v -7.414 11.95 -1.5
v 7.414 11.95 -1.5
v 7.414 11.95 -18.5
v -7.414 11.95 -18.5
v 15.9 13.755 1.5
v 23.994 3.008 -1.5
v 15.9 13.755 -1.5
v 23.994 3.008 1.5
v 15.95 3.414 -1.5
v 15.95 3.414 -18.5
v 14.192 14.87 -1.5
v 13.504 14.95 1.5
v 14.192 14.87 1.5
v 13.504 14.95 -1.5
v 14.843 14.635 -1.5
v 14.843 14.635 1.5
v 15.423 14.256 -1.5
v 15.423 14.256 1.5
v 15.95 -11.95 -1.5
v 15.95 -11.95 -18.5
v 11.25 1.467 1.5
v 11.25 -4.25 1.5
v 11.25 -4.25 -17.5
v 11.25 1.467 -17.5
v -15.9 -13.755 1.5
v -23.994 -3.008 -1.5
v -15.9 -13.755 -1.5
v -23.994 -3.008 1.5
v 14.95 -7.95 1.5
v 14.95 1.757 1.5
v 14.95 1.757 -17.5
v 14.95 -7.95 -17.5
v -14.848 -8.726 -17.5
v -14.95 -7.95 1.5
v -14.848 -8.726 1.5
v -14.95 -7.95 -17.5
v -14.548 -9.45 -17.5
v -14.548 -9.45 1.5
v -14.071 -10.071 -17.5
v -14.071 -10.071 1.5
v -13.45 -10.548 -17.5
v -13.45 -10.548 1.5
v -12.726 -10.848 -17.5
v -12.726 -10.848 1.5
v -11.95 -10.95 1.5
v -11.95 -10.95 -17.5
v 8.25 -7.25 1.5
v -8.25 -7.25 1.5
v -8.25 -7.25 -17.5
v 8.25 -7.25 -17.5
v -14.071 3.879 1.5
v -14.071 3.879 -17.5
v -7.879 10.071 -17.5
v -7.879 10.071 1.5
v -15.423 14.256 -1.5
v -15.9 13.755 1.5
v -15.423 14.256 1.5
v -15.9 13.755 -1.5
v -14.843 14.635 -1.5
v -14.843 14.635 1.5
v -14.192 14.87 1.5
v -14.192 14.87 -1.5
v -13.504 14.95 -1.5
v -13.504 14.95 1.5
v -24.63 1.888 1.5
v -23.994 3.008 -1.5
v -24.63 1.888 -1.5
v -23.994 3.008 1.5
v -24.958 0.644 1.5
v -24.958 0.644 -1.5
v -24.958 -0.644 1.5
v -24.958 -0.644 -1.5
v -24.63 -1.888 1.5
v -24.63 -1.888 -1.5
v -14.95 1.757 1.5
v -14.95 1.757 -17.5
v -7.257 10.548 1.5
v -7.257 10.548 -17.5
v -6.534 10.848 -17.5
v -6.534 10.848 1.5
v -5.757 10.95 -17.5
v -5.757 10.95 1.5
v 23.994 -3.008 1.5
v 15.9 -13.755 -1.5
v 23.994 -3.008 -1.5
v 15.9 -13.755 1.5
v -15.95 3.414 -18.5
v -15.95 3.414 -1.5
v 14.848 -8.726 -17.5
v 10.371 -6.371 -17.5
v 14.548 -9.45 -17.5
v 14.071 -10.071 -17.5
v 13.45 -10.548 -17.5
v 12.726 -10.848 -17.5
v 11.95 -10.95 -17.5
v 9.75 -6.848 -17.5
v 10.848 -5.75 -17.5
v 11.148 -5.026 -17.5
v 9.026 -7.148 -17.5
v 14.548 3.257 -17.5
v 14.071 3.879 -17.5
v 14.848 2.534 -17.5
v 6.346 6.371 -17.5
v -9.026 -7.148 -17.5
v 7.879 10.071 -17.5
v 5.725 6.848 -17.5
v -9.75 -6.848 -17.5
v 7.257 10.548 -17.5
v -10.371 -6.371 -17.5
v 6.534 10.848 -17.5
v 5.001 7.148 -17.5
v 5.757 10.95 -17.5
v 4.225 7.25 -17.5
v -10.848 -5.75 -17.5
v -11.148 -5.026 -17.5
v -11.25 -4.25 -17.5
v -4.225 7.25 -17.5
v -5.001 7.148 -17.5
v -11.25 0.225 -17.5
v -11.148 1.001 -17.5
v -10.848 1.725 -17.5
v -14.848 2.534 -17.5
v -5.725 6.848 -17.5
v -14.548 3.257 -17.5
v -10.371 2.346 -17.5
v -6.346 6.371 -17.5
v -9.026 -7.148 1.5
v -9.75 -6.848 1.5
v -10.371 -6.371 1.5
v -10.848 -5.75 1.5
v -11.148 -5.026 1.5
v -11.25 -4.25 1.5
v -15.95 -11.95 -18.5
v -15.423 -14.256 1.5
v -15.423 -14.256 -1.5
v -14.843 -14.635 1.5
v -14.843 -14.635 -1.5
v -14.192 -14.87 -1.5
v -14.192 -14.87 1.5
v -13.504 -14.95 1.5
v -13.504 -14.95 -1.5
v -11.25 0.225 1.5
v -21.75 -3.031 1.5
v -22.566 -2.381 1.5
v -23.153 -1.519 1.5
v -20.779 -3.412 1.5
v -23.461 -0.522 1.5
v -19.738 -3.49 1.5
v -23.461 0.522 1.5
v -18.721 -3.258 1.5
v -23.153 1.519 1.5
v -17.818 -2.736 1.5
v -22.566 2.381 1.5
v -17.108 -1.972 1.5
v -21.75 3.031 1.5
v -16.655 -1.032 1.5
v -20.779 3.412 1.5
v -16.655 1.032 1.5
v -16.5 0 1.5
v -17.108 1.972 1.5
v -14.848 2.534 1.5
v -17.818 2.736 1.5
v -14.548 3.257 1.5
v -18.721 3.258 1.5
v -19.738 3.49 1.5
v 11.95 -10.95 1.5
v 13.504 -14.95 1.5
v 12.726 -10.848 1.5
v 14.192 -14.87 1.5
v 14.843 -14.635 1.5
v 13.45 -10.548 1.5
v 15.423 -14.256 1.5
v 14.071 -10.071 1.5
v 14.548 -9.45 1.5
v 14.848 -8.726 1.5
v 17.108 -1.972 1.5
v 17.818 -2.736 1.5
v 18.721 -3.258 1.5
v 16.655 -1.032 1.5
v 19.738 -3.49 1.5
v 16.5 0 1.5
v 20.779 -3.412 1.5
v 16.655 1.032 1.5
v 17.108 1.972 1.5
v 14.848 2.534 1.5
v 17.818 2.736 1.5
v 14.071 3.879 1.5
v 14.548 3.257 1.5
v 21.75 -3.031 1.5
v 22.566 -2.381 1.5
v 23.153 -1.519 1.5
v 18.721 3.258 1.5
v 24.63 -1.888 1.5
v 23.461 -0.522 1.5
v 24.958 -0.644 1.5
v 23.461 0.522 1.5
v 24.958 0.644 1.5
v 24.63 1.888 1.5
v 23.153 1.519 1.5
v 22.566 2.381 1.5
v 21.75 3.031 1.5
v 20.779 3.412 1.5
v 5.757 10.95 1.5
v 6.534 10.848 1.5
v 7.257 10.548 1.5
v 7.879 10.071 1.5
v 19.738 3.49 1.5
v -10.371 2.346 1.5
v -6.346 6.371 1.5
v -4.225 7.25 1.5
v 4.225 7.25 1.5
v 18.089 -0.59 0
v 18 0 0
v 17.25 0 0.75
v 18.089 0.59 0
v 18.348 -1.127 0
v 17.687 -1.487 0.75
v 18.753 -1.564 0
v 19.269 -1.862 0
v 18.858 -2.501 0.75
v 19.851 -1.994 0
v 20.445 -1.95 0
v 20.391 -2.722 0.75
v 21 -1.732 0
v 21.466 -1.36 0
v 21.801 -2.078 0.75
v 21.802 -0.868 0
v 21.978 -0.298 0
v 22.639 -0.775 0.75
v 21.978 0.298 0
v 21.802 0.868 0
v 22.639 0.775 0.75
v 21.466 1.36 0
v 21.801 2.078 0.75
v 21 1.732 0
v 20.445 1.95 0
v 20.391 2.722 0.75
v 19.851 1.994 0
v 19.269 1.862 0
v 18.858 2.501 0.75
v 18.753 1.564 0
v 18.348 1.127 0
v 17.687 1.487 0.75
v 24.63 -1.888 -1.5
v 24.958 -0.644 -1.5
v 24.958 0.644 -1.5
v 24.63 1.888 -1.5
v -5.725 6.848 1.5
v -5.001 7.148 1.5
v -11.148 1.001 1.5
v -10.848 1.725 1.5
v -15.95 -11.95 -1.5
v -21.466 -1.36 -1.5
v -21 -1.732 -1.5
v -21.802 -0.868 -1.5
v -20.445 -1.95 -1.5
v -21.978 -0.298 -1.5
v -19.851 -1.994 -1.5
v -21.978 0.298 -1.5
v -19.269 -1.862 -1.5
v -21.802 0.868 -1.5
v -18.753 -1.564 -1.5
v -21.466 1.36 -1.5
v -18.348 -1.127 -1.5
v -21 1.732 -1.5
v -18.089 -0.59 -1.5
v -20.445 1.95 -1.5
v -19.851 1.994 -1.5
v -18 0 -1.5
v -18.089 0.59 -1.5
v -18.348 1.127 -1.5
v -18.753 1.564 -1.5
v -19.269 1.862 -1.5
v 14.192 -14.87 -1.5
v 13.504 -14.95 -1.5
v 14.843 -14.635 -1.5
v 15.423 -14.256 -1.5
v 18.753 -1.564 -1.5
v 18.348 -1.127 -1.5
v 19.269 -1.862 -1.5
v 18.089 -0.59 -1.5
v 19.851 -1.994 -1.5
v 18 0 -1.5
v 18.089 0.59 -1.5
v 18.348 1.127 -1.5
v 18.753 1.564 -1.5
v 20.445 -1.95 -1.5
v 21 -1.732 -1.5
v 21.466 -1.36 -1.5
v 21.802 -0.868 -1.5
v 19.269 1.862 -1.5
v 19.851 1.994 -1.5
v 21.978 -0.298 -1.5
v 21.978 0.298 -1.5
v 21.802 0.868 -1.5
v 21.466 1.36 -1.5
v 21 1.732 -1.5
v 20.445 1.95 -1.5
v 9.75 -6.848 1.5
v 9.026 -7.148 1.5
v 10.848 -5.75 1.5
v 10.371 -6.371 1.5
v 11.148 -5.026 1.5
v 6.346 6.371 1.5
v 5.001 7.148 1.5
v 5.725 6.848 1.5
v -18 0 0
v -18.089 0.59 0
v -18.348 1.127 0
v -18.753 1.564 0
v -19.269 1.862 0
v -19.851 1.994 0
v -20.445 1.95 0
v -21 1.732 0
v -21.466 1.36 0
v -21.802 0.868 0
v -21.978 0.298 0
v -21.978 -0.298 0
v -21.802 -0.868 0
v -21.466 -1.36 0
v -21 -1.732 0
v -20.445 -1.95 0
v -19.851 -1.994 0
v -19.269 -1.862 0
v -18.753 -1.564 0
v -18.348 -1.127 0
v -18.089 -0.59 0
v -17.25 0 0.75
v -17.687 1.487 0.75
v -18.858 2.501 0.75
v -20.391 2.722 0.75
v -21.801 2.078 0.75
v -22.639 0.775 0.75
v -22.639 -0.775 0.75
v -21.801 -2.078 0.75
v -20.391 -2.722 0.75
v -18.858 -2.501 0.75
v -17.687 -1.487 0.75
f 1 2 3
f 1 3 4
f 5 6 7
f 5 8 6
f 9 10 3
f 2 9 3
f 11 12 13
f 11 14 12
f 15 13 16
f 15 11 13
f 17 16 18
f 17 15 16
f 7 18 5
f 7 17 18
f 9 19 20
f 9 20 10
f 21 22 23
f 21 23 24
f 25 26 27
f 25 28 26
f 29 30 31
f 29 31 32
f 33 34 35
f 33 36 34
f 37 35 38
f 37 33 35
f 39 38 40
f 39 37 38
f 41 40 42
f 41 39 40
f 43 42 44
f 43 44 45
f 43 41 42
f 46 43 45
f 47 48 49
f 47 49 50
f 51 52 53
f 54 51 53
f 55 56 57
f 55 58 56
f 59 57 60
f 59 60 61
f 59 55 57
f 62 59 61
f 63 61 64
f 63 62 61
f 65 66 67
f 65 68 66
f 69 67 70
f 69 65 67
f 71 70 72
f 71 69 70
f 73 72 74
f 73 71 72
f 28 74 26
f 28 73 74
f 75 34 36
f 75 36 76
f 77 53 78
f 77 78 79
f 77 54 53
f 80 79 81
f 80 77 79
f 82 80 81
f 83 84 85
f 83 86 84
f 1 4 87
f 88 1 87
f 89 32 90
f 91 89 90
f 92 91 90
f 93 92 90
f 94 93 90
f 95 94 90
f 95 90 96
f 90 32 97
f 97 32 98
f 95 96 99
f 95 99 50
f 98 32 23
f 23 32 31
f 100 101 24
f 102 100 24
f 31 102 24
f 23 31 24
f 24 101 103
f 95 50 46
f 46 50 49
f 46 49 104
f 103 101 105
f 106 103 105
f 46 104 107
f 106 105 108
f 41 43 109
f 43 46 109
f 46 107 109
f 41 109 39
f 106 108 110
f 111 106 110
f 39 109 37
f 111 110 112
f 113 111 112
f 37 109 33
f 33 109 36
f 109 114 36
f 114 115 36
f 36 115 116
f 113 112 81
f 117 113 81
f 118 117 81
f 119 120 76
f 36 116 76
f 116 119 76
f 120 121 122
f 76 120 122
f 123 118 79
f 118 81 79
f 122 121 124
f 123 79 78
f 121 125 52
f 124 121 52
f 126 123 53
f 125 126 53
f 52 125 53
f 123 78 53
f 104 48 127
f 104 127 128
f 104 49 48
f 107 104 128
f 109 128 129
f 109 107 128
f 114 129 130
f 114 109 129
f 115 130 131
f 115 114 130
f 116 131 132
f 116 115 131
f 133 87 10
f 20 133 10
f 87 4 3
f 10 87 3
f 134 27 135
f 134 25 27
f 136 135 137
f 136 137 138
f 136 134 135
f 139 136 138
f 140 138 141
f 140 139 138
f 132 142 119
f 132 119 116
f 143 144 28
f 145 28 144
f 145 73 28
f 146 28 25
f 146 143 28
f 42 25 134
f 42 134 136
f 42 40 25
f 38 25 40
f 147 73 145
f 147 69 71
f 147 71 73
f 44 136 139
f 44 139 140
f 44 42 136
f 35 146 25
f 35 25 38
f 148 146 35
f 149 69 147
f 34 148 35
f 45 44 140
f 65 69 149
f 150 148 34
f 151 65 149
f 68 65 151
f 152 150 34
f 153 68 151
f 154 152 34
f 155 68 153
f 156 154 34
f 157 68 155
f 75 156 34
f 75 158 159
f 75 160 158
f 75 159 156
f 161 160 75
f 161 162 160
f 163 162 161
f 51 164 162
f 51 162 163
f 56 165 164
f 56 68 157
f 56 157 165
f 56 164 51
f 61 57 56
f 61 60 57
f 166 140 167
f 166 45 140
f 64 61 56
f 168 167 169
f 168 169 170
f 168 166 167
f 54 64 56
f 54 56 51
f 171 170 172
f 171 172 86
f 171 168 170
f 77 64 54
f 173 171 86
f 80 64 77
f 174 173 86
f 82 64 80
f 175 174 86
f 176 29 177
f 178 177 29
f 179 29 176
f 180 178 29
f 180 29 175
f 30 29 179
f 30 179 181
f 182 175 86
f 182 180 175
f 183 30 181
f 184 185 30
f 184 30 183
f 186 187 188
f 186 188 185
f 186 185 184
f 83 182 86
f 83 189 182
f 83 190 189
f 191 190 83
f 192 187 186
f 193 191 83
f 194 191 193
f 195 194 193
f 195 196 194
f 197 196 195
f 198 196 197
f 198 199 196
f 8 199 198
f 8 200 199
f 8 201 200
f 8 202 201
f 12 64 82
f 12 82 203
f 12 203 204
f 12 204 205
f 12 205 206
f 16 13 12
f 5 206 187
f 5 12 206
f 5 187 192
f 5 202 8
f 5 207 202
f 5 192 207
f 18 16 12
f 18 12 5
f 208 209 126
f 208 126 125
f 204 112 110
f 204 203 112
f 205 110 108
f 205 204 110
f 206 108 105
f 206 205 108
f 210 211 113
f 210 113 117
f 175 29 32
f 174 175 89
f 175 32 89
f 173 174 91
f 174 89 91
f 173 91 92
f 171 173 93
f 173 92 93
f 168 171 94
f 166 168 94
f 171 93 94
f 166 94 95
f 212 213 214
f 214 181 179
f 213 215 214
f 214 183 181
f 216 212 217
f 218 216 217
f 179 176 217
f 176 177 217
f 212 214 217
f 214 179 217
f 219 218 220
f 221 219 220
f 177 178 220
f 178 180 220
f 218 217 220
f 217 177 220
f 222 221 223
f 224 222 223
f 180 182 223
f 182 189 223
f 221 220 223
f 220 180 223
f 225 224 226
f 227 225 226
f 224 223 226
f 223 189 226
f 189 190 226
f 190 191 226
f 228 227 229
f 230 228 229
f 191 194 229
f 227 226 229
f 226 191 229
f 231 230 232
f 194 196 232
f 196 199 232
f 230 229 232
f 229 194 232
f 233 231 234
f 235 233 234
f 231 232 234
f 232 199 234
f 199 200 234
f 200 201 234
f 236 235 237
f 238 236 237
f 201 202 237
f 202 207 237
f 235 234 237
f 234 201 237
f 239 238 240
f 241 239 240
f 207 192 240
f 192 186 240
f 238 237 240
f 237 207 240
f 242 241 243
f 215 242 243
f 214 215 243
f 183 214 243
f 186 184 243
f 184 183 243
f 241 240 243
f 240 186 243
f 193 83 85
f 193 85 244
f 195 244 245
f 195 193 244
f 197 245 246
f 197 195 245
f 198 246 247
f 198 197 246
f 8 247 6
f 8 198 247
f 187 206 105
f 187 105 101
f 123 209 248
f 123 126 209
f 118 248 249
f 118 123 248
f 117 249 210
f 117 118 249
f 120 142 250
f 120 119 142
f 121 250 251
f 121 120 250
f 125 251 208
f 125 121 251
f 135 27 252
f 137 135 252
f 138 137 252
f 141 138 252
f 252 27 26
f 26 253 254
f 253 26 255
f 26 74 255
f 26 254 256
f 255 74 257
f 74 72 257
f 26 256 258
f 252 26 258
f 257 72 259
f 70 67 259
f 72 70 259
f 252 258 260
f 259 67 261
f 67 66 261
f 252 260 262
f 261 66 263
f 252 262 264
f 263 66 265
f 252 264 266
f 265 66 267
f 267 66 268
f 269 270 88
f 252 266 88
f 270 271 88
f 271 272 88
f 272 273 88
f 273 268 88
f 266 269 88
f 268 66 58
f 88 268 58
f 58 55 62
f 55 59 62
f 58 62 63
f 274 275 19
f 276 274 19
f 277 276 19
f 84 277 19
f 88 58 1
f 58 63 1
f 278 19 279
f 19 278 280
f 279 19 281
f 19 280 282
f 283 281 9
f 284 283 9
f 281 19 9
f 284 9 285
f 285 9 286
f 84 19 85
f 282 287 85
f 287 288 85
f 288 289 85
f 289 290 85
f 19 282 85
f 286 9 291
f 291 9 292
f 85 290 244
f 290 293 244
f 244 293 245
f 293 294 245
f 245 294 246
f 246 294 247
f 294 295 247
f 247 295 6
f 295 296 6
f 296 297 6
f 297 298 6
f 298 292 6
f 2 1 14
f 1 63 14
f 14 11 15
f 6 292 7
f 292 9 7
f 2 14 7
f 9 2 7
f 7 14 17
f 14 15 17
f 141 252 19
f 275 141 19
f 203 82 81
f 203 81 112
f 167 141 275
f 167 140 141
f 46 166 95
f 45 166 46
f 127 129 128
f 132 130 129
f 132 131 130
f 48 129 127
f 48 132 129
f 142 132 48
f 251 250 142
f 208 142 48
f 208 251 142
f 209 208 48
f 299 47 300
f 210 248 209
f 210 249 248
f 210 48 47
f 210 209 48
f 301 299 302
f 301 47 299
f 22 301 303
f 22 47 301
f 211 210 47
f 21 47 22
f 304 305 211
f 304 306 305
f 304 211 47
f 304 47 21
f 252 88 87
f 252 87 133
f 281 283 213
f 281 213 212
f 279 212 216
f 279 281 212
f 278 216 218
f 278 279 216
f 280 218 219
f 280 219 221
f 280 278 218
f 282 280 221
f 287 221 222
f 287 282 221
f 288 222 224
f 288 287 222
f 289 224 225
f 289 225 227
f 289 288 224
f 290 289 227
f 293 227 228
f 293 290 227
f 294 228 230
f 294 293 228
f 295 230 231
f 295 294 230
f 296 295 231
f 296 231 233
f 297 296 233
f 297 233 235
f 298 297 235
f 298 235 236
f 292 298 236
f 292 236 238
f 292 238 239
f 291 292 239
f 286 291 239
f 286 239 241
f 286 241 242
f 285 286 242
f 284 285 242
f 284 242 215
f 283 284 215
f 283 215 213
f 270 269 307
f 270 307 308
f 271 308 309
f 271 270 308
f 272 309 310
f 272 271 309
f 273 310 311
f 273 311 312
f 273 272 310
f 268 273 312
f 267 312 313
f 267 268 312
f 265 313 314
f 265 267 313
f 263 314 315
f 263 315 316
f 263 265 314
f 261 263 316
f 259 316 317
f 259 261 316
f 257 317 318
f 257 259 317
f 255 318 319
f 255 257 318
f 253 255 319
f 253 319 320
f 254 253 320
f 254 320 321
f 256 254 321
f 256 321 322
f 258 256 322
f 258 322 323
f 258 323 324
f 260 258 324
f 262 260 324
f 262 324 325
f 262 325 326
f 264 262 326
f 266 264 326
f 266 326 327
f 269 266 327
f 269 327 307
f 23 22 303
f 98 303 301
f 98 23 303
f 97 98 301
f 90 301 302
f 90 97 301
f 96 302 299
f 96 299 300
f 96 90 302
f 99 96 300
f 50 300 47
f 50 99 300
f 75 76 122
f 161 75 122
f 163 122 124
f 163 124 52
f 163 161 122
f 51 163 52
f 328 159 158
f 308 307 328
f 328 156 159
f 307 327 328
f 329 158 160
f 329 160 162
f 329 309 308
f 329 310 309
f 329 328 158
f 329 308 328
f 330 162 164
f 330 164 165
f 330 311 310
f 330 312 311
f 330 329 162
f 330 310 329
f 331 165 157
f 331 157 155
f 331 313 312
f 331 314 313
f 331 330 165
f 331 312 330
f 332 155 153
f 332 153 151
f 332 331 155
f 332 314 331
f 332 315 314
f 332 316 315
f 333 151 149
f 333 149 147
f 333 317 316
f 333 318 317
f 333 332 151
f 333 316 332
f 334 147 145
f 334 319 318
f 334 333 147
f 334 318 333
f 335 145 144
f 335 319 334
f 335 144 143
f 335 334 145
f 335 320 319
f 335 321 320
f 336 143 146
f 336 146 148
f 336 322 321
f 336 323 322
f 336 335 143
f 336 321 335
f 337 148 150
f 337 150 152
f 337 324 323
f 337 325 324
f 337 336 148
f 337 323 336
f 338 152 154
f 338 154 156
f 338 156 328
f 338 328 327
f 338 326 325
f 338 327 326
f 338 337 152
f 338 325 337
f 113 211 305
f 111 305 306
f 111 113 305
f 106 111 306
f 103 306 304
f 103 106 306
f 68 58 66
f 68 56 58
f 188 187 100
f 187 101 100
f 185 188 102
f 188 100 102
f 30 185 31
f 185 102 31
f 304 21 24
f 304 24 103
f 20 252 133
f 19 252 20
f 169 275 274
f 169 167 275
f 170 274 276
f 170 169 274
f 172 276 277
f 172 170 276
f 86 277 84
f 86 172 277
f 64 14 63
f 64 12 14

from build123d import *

# Parameters (mm, degrees)
SKETCH1_R           = 2
BOSS_EXTRUDE1_DEPTH = 1.5
BOSS_EXTRUDE2_START = -3
BOSS_EXTRUDE2_DEPTH = 20
BOSS_EXTRUDE3_DEPTH = 1
CHAMFER1_SIZE       = 1.5
FILLET1_R           = 3


with BuildPart() as part:
    # Sketch1 → Boss-Extrude1 (new, symmetric)
    with BuildSketch(Plane.XY):
        with BuildLine():
            Line((-23.993973904, -3.008018028), (-15, -14.95))
            Line((-15, -14.95), (15, -14.95))
            Line((15, -14.95), (23.993973904, -3.008018028))
            ThreePointArc((23.993973904, -3.008018028), (25, 0), (23.993973904, 3.008018028))
            Line((23.993973904, 3.008018028), (15, 14.95))
            Line((15, 14.95), (-15, 14.95))
            Line((-15, 14.95), (-23.993973904, 3.008018028))
            ThreePointArc((-23.993973904, 3.008018028), (-25, 0), (-23.993973904, -3.008018028))
        make_face()
        with Locations((-20, 0)):
            Circle(SKETCH1_R, mode=Mode.SUBTRACT)
        with Locations(Location((20, 0, 0), (0, 0, 180))):
            Circle(SKETCH1_R, mode=Mode.SUBTRACT)
        Polygon((-14.95, 3), (-7, 10.95), (7, 10.95), (14.95, 3), (14.95, -10.95), (-14.95, -10.95), align=None, mode=Mode.SUBTRACT)
    extrude(amount=BOSS_EXTRUDE1_DEPTH, both=True)

    # Sketch2 → Boss-Extrude2 (add)
    # profile 1 of 2: a face of its own
    with BuildSketch(Plane(origin=(0, 0, -1.5), x_dir=(-1, 0, 0), z_dir=(0, 0, -1)).offset(BOSS_EXTRUDE2_START)):
        Polygon((-15.95, 3.414213562), (-7.414213562, 11.95), (7.414213562, 11.95), (15.95, 3.414213562), (15.95, -11.95), (-15.95, -11.95), align=None)
        Polygon((14.95, -10.95), (-14.95, -10.95), (-14.95, 3), (-7, 10.95), (7, 10.95), (14.95, 3), align=None, mode=Mode.SUBTRACT)
    # profile 2 of 2: a face of its own
    with BuildSketch(Plane(origin=(0, 0, -1.5), x_dir=(-1, 0, 0), z_dir=(0, 0, -1)).offset(BOSS_EXTRUDE2_START)):
        Polygon((-11.25, 1.467409819), (-5.467409819, 7.25), (5.467409819, 7.25), (11.25, 1.467409819), (11.25, -7.25), (-11.25, -7.25), align=None)
    extrude(amount=BOSS_EXTRUDE2_DEPTH)


with BuildPart() as boss_extrude2_piece_1:
    # of the separate pieces the step leaves, piece 1, a body of its own (boss_extrude2_pieces)
    add(part.part.solids().sort_by_distance((11.25, 1.467409819, 1.5))[0])



with BuildPart() as boss_extrude2_piece_2:
    # of the separate pieces the step leaves, piece 2, a body of its own (boss_extrude2_pieces)
    add(part.part.solids().sort_by_distance((-23.993973904, 3.008018028, -1.5))[0])


with BuildPart() as boss_extrude2_piece_1_1:
    add(boss_extrude2_piece_1.part)

    add(boss_extrude2_piece_2.part)  # Boss-Extrude3 merges Boss-Extrude2 piece 2
    # Sketch3 → Boss-Extrude3 (add)
    with BuildSketch(Plane(origin=(0, 0, -18.5), x_dir=(-1, 0, 0), z_dir=(0, 0, -1))):
        Polygon((15.95, -11.95), (15.95, 3.414213562), (7.414213562, 11.95), (-7.414213562, 11.95), (-15.95, 3.414213562), (-15.95, -11.95), align=None)
    extrude(amount=-BOSS_EXTRUDE3_DEPTH)

    # Chamfer1
    chamfer1_edges = [boss_extrude2_piece_1_1.edges().sort_by_distance(p)[0] for p in [
        (-22, 0, 1.5),
        (22, 0, 1.5),
    ]]
    chamfer(chamfer1_edges, length=CHAMFER1_SIZE)

    # Fillet1
    fillet1_edges = [boss_extrude2_piece_1_1.edges().sort_by_distance(p)[0] for p in [
        (-5.467409819, 7.25, -8),
        (5.467409819, 7.25, -8),
        (11.25, -7.25, -8),
        (-11.25, -7.25, -8),
        (-11.25, 1.467409819, -8),
        (-15, 14.95, 0),
        (15, 14.95, 0),
        (15, -14.95, 0),
        (-15, -14.95, 0),
        (14.95, -10.95, -8),
        (14.95, 3, -8),
        (7, 10.95, -8),
        (-7, 10.95, -8),
        (-14.95, 3, -8),
        (-14.95, -10.95, -8),
    ]]
    fillet(fillet1_edges, radius=FILLET1_R)


solid = boss_extrude2_piece_1_1.part
